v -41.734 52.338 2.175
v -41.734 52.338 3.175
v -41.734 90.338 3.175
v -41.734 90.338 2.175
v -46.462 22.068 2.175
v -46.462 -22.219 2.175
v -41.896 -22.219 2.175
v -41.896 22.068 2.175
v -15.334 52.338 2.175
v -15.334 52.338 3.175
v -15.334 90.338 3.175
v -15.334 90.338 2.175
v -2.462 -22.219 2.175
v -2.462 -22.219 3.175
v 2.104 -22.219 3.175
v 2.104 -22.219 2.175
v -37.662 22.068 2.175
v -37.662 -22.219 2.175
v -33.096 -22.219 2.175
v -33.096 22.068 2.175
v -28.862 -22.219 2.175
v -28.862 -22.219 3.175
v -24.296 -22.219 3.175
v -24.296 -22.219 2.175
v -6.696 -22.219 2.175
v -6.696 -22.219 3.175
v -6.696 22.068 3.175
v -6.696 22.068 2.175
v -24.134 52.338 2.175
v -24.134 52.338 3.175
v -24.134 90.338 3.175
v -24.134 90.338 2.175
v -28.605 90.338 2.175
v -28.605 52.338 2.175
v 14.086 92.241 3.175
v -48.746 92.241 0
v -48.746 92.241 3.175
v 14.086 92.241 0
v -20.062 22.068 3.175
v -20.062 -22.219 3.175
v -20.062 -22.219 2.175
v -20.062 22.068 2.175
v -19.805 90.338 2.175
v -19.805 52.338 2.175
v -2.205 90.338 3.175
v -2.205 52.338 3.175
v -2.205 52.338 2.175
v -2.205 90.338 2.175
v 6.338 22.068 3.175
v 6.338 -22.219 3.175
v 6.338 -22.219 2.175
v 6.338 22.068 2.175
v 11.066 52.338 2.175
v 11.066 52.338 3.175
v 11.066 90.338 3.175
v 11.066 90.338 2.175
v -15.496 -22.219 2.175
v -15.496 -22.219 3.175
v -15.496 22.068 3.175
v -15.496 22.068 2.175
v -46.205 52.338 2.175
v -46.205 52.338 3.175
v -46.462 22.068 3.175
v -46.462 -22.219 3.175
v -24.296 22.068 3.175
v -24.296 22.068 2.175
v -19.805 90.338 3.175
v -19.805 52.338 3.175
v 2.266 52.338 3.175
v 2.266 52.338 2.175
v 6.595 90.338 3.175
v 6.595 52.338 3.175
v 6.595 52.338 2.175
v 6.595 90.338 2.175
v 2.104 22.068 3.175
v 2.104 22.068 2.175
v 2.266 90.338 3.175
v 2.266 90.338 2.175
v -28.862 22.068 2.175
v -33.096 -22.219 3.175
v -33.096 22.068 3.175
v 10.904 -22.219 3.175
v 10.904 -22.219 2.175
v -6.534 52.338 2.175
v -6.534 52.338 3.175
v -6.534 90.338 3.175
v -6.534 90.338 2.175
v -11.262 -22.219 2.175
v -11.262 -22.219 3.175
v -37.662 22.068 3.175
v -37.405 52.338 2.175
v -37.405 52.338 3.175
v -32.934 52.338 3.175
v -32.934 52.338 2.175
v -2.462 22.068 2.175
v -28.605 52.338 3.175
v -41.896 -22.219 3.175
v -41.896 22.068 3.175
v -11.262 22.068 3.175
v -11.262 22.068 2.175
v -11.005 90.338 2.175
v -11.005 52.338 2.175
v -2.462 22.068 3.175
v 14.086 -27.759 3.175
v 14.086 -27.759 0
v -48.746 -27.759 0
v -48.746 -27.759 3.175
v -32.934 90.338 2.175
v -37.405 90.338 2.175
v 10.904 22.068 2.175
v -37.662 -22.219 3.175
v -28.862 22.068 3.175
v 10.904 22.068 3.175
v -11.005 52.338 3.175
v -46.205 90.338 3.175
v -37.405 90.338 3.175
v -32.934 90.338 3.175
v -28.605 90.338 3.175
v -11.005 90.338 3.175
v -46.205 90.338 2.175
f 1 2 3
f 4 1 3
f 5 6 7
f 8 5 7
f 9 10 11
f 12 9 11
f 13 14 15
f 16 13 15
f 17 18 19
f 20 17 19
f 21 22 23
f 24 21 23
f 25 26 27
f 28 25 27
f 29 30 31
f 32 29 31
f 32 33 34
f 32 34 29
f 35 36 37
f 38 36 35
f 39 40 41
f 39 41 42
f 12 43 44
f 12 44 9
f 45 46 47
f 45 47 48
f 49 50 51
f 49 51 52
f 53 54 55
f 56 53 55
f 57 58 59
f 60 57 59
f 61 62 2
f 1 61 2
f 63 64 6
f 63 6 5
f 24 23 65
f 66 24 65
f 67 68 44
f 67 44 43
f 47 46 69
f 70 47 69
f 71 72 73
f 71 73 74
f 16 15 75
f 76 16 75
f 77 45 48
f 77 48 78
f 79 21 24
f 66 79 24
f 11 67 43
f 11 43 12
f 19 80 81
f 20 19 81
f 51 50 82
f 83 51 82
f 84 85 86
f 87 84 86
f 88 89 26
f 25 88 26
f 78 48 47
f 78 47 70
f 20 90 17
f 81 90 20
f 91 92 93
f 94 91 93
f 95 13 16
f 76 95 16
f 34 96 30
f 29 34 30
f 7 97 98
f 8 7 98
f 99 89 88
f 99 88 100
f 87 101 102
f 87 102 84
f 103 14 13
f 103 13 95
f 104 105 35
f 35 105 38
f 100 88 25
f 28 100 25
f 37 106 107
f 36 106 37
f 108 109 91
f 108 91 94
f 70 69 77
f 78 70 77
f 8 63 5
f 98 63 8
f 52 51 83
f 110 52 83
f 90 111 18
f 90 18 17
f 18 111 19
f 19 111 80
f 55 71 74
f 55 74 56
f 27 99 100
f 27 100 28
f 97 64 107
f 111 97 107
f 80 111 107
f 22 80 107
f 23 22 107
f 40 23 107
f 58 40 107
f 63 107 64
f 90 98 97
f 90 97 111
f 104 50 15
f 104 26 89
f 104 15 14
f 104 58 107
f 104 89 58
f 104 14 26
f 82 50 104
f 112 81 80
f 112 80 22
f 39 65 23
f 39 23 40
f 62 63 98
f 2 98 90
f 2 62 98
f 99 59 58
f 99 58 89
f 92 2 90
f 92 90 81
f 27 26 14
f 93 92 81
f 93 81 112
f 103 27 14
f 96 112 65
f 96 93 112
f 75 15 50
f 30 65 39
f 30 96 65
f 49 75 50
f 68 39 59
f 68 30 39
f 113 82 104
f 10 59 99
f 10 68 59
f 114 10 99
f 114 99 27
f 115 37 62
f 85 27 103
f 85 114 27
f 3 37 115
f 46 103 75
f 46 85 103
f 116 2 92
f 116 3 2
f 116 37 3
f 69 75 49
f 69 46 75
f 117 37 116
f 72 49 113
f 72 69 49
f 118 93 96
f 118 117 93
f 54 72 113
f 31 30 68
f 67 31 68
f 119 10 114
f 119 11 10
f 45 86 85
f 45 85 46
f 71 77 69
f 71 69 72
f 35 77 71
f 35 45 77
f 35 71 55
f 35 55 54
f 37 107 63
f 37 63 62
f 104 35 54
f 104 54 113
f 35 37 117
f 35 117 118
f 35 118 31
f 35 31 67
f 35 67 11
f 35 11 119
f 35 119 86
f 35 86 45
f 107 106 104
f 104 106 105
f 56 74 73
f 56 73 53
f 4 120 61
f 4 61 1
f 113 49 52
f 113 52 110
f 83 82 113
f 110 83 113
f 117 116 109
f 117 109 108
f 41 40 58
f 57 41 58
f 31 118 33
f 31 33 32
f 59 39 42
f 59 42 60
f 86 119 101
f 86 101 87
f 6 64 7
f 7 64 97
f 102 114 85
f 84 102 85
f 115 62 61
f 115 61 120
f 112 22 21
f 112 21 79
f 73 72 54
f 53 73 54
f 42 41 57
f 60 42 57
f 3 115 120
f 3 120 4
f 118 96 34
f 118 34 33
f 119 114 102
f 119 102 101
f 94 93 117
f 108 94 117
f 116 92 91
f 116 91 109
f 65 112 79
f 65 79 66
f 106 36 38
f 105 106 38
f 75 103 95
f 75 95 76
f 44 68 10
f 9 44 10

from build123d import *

# Parameters (mm, degrees)
F0_W     = 62.8318530718
F0_H     = 120
F1_DEPTH = 3.175
F2_W     = 4.4705853476
F2_H     = 38
F3_W     = 4.4705853476
F3_H     = 38
F3_W_2   = 4.565641284
F3_H_2   = 44.2867465317
F4_DEPTH = 1


# Not quite as in the source:
# - a length typed as a fraction of an inch, garbled in the dataset ("3 / 203.2 mm" for 3/8 in), is restored


with BuildPart() as f1:
    # F0 (on Top) → F1 (new body)
    with BuildSketch(Plane.XY):
        with Locations((-17.3296490684, 32.2412615943)):
            Rectangle(F0_W, F0_H)
    extrude(amount=F1_DEPTH)

    # F2 (on face) + F3 (on face) → F4 (cut)
    with BuildSketch(Plane.XY.offset(3.175)):
        with Locations((-26.3693033695, 71.3383685797)):
            Rectangle(F2_W, F2_H)
        with Locations((-43.9693033695, 71.3383685797)):
            Rectangle(F2_W, F2_H)
        with Locations((-35.1693033695, 71.3383685797)):
            Rectangle(F2_W, F2_H)
        with Locations((-8.7693033695, 71.3383685797)):
            Rectangle(F2_W, F2_H)
        with Locations((0.0306966305, 71.3383685797)):
            Rectangle(F2_W, F2_H)
        with Locations((8.8306966305, 71.3383685797)):
            Rectangle(F2_W, F2_H)
    with BuildSketch(Plane.XY.offset(3.175)):
        with Locations((-17.5693033695, 71.3383685797)):
            Rectangle(F3_W, F3_H)
        with Locations((-0.1788695753, -0.0753514469)):
            Rectangle(F3_W_2, F3_H_2)
        with Locations((-8.9788695753, -0.0753514469)):
            Rectangle(F3_W_2, F3_H_2)
        with Locations((-17.7788695753, -0.0753514469)):
            Rectangle(F3_W_2, F3_H_2)
        with Locations((-26.5788695753, -0.0753514469)):
            Rectangle(F3_W_2, F3_H_2)
        with Locations((-35.3788695753, -0.0753514469)):
            Rectangle(F3_W_2, F3_H_2)
        with Locations((-44.1788695753, -0.0753514469)):
            Rectangle(F3_W_2, F3_H_2)
        with Locations((8.6211304247, -0.0753514469)):
            Rectangle(F3_W_2, F3_H_2)
    extrude(amount=-F4_DEPTH, mode=Mode.SUBTRACT)


solid = f1.part
